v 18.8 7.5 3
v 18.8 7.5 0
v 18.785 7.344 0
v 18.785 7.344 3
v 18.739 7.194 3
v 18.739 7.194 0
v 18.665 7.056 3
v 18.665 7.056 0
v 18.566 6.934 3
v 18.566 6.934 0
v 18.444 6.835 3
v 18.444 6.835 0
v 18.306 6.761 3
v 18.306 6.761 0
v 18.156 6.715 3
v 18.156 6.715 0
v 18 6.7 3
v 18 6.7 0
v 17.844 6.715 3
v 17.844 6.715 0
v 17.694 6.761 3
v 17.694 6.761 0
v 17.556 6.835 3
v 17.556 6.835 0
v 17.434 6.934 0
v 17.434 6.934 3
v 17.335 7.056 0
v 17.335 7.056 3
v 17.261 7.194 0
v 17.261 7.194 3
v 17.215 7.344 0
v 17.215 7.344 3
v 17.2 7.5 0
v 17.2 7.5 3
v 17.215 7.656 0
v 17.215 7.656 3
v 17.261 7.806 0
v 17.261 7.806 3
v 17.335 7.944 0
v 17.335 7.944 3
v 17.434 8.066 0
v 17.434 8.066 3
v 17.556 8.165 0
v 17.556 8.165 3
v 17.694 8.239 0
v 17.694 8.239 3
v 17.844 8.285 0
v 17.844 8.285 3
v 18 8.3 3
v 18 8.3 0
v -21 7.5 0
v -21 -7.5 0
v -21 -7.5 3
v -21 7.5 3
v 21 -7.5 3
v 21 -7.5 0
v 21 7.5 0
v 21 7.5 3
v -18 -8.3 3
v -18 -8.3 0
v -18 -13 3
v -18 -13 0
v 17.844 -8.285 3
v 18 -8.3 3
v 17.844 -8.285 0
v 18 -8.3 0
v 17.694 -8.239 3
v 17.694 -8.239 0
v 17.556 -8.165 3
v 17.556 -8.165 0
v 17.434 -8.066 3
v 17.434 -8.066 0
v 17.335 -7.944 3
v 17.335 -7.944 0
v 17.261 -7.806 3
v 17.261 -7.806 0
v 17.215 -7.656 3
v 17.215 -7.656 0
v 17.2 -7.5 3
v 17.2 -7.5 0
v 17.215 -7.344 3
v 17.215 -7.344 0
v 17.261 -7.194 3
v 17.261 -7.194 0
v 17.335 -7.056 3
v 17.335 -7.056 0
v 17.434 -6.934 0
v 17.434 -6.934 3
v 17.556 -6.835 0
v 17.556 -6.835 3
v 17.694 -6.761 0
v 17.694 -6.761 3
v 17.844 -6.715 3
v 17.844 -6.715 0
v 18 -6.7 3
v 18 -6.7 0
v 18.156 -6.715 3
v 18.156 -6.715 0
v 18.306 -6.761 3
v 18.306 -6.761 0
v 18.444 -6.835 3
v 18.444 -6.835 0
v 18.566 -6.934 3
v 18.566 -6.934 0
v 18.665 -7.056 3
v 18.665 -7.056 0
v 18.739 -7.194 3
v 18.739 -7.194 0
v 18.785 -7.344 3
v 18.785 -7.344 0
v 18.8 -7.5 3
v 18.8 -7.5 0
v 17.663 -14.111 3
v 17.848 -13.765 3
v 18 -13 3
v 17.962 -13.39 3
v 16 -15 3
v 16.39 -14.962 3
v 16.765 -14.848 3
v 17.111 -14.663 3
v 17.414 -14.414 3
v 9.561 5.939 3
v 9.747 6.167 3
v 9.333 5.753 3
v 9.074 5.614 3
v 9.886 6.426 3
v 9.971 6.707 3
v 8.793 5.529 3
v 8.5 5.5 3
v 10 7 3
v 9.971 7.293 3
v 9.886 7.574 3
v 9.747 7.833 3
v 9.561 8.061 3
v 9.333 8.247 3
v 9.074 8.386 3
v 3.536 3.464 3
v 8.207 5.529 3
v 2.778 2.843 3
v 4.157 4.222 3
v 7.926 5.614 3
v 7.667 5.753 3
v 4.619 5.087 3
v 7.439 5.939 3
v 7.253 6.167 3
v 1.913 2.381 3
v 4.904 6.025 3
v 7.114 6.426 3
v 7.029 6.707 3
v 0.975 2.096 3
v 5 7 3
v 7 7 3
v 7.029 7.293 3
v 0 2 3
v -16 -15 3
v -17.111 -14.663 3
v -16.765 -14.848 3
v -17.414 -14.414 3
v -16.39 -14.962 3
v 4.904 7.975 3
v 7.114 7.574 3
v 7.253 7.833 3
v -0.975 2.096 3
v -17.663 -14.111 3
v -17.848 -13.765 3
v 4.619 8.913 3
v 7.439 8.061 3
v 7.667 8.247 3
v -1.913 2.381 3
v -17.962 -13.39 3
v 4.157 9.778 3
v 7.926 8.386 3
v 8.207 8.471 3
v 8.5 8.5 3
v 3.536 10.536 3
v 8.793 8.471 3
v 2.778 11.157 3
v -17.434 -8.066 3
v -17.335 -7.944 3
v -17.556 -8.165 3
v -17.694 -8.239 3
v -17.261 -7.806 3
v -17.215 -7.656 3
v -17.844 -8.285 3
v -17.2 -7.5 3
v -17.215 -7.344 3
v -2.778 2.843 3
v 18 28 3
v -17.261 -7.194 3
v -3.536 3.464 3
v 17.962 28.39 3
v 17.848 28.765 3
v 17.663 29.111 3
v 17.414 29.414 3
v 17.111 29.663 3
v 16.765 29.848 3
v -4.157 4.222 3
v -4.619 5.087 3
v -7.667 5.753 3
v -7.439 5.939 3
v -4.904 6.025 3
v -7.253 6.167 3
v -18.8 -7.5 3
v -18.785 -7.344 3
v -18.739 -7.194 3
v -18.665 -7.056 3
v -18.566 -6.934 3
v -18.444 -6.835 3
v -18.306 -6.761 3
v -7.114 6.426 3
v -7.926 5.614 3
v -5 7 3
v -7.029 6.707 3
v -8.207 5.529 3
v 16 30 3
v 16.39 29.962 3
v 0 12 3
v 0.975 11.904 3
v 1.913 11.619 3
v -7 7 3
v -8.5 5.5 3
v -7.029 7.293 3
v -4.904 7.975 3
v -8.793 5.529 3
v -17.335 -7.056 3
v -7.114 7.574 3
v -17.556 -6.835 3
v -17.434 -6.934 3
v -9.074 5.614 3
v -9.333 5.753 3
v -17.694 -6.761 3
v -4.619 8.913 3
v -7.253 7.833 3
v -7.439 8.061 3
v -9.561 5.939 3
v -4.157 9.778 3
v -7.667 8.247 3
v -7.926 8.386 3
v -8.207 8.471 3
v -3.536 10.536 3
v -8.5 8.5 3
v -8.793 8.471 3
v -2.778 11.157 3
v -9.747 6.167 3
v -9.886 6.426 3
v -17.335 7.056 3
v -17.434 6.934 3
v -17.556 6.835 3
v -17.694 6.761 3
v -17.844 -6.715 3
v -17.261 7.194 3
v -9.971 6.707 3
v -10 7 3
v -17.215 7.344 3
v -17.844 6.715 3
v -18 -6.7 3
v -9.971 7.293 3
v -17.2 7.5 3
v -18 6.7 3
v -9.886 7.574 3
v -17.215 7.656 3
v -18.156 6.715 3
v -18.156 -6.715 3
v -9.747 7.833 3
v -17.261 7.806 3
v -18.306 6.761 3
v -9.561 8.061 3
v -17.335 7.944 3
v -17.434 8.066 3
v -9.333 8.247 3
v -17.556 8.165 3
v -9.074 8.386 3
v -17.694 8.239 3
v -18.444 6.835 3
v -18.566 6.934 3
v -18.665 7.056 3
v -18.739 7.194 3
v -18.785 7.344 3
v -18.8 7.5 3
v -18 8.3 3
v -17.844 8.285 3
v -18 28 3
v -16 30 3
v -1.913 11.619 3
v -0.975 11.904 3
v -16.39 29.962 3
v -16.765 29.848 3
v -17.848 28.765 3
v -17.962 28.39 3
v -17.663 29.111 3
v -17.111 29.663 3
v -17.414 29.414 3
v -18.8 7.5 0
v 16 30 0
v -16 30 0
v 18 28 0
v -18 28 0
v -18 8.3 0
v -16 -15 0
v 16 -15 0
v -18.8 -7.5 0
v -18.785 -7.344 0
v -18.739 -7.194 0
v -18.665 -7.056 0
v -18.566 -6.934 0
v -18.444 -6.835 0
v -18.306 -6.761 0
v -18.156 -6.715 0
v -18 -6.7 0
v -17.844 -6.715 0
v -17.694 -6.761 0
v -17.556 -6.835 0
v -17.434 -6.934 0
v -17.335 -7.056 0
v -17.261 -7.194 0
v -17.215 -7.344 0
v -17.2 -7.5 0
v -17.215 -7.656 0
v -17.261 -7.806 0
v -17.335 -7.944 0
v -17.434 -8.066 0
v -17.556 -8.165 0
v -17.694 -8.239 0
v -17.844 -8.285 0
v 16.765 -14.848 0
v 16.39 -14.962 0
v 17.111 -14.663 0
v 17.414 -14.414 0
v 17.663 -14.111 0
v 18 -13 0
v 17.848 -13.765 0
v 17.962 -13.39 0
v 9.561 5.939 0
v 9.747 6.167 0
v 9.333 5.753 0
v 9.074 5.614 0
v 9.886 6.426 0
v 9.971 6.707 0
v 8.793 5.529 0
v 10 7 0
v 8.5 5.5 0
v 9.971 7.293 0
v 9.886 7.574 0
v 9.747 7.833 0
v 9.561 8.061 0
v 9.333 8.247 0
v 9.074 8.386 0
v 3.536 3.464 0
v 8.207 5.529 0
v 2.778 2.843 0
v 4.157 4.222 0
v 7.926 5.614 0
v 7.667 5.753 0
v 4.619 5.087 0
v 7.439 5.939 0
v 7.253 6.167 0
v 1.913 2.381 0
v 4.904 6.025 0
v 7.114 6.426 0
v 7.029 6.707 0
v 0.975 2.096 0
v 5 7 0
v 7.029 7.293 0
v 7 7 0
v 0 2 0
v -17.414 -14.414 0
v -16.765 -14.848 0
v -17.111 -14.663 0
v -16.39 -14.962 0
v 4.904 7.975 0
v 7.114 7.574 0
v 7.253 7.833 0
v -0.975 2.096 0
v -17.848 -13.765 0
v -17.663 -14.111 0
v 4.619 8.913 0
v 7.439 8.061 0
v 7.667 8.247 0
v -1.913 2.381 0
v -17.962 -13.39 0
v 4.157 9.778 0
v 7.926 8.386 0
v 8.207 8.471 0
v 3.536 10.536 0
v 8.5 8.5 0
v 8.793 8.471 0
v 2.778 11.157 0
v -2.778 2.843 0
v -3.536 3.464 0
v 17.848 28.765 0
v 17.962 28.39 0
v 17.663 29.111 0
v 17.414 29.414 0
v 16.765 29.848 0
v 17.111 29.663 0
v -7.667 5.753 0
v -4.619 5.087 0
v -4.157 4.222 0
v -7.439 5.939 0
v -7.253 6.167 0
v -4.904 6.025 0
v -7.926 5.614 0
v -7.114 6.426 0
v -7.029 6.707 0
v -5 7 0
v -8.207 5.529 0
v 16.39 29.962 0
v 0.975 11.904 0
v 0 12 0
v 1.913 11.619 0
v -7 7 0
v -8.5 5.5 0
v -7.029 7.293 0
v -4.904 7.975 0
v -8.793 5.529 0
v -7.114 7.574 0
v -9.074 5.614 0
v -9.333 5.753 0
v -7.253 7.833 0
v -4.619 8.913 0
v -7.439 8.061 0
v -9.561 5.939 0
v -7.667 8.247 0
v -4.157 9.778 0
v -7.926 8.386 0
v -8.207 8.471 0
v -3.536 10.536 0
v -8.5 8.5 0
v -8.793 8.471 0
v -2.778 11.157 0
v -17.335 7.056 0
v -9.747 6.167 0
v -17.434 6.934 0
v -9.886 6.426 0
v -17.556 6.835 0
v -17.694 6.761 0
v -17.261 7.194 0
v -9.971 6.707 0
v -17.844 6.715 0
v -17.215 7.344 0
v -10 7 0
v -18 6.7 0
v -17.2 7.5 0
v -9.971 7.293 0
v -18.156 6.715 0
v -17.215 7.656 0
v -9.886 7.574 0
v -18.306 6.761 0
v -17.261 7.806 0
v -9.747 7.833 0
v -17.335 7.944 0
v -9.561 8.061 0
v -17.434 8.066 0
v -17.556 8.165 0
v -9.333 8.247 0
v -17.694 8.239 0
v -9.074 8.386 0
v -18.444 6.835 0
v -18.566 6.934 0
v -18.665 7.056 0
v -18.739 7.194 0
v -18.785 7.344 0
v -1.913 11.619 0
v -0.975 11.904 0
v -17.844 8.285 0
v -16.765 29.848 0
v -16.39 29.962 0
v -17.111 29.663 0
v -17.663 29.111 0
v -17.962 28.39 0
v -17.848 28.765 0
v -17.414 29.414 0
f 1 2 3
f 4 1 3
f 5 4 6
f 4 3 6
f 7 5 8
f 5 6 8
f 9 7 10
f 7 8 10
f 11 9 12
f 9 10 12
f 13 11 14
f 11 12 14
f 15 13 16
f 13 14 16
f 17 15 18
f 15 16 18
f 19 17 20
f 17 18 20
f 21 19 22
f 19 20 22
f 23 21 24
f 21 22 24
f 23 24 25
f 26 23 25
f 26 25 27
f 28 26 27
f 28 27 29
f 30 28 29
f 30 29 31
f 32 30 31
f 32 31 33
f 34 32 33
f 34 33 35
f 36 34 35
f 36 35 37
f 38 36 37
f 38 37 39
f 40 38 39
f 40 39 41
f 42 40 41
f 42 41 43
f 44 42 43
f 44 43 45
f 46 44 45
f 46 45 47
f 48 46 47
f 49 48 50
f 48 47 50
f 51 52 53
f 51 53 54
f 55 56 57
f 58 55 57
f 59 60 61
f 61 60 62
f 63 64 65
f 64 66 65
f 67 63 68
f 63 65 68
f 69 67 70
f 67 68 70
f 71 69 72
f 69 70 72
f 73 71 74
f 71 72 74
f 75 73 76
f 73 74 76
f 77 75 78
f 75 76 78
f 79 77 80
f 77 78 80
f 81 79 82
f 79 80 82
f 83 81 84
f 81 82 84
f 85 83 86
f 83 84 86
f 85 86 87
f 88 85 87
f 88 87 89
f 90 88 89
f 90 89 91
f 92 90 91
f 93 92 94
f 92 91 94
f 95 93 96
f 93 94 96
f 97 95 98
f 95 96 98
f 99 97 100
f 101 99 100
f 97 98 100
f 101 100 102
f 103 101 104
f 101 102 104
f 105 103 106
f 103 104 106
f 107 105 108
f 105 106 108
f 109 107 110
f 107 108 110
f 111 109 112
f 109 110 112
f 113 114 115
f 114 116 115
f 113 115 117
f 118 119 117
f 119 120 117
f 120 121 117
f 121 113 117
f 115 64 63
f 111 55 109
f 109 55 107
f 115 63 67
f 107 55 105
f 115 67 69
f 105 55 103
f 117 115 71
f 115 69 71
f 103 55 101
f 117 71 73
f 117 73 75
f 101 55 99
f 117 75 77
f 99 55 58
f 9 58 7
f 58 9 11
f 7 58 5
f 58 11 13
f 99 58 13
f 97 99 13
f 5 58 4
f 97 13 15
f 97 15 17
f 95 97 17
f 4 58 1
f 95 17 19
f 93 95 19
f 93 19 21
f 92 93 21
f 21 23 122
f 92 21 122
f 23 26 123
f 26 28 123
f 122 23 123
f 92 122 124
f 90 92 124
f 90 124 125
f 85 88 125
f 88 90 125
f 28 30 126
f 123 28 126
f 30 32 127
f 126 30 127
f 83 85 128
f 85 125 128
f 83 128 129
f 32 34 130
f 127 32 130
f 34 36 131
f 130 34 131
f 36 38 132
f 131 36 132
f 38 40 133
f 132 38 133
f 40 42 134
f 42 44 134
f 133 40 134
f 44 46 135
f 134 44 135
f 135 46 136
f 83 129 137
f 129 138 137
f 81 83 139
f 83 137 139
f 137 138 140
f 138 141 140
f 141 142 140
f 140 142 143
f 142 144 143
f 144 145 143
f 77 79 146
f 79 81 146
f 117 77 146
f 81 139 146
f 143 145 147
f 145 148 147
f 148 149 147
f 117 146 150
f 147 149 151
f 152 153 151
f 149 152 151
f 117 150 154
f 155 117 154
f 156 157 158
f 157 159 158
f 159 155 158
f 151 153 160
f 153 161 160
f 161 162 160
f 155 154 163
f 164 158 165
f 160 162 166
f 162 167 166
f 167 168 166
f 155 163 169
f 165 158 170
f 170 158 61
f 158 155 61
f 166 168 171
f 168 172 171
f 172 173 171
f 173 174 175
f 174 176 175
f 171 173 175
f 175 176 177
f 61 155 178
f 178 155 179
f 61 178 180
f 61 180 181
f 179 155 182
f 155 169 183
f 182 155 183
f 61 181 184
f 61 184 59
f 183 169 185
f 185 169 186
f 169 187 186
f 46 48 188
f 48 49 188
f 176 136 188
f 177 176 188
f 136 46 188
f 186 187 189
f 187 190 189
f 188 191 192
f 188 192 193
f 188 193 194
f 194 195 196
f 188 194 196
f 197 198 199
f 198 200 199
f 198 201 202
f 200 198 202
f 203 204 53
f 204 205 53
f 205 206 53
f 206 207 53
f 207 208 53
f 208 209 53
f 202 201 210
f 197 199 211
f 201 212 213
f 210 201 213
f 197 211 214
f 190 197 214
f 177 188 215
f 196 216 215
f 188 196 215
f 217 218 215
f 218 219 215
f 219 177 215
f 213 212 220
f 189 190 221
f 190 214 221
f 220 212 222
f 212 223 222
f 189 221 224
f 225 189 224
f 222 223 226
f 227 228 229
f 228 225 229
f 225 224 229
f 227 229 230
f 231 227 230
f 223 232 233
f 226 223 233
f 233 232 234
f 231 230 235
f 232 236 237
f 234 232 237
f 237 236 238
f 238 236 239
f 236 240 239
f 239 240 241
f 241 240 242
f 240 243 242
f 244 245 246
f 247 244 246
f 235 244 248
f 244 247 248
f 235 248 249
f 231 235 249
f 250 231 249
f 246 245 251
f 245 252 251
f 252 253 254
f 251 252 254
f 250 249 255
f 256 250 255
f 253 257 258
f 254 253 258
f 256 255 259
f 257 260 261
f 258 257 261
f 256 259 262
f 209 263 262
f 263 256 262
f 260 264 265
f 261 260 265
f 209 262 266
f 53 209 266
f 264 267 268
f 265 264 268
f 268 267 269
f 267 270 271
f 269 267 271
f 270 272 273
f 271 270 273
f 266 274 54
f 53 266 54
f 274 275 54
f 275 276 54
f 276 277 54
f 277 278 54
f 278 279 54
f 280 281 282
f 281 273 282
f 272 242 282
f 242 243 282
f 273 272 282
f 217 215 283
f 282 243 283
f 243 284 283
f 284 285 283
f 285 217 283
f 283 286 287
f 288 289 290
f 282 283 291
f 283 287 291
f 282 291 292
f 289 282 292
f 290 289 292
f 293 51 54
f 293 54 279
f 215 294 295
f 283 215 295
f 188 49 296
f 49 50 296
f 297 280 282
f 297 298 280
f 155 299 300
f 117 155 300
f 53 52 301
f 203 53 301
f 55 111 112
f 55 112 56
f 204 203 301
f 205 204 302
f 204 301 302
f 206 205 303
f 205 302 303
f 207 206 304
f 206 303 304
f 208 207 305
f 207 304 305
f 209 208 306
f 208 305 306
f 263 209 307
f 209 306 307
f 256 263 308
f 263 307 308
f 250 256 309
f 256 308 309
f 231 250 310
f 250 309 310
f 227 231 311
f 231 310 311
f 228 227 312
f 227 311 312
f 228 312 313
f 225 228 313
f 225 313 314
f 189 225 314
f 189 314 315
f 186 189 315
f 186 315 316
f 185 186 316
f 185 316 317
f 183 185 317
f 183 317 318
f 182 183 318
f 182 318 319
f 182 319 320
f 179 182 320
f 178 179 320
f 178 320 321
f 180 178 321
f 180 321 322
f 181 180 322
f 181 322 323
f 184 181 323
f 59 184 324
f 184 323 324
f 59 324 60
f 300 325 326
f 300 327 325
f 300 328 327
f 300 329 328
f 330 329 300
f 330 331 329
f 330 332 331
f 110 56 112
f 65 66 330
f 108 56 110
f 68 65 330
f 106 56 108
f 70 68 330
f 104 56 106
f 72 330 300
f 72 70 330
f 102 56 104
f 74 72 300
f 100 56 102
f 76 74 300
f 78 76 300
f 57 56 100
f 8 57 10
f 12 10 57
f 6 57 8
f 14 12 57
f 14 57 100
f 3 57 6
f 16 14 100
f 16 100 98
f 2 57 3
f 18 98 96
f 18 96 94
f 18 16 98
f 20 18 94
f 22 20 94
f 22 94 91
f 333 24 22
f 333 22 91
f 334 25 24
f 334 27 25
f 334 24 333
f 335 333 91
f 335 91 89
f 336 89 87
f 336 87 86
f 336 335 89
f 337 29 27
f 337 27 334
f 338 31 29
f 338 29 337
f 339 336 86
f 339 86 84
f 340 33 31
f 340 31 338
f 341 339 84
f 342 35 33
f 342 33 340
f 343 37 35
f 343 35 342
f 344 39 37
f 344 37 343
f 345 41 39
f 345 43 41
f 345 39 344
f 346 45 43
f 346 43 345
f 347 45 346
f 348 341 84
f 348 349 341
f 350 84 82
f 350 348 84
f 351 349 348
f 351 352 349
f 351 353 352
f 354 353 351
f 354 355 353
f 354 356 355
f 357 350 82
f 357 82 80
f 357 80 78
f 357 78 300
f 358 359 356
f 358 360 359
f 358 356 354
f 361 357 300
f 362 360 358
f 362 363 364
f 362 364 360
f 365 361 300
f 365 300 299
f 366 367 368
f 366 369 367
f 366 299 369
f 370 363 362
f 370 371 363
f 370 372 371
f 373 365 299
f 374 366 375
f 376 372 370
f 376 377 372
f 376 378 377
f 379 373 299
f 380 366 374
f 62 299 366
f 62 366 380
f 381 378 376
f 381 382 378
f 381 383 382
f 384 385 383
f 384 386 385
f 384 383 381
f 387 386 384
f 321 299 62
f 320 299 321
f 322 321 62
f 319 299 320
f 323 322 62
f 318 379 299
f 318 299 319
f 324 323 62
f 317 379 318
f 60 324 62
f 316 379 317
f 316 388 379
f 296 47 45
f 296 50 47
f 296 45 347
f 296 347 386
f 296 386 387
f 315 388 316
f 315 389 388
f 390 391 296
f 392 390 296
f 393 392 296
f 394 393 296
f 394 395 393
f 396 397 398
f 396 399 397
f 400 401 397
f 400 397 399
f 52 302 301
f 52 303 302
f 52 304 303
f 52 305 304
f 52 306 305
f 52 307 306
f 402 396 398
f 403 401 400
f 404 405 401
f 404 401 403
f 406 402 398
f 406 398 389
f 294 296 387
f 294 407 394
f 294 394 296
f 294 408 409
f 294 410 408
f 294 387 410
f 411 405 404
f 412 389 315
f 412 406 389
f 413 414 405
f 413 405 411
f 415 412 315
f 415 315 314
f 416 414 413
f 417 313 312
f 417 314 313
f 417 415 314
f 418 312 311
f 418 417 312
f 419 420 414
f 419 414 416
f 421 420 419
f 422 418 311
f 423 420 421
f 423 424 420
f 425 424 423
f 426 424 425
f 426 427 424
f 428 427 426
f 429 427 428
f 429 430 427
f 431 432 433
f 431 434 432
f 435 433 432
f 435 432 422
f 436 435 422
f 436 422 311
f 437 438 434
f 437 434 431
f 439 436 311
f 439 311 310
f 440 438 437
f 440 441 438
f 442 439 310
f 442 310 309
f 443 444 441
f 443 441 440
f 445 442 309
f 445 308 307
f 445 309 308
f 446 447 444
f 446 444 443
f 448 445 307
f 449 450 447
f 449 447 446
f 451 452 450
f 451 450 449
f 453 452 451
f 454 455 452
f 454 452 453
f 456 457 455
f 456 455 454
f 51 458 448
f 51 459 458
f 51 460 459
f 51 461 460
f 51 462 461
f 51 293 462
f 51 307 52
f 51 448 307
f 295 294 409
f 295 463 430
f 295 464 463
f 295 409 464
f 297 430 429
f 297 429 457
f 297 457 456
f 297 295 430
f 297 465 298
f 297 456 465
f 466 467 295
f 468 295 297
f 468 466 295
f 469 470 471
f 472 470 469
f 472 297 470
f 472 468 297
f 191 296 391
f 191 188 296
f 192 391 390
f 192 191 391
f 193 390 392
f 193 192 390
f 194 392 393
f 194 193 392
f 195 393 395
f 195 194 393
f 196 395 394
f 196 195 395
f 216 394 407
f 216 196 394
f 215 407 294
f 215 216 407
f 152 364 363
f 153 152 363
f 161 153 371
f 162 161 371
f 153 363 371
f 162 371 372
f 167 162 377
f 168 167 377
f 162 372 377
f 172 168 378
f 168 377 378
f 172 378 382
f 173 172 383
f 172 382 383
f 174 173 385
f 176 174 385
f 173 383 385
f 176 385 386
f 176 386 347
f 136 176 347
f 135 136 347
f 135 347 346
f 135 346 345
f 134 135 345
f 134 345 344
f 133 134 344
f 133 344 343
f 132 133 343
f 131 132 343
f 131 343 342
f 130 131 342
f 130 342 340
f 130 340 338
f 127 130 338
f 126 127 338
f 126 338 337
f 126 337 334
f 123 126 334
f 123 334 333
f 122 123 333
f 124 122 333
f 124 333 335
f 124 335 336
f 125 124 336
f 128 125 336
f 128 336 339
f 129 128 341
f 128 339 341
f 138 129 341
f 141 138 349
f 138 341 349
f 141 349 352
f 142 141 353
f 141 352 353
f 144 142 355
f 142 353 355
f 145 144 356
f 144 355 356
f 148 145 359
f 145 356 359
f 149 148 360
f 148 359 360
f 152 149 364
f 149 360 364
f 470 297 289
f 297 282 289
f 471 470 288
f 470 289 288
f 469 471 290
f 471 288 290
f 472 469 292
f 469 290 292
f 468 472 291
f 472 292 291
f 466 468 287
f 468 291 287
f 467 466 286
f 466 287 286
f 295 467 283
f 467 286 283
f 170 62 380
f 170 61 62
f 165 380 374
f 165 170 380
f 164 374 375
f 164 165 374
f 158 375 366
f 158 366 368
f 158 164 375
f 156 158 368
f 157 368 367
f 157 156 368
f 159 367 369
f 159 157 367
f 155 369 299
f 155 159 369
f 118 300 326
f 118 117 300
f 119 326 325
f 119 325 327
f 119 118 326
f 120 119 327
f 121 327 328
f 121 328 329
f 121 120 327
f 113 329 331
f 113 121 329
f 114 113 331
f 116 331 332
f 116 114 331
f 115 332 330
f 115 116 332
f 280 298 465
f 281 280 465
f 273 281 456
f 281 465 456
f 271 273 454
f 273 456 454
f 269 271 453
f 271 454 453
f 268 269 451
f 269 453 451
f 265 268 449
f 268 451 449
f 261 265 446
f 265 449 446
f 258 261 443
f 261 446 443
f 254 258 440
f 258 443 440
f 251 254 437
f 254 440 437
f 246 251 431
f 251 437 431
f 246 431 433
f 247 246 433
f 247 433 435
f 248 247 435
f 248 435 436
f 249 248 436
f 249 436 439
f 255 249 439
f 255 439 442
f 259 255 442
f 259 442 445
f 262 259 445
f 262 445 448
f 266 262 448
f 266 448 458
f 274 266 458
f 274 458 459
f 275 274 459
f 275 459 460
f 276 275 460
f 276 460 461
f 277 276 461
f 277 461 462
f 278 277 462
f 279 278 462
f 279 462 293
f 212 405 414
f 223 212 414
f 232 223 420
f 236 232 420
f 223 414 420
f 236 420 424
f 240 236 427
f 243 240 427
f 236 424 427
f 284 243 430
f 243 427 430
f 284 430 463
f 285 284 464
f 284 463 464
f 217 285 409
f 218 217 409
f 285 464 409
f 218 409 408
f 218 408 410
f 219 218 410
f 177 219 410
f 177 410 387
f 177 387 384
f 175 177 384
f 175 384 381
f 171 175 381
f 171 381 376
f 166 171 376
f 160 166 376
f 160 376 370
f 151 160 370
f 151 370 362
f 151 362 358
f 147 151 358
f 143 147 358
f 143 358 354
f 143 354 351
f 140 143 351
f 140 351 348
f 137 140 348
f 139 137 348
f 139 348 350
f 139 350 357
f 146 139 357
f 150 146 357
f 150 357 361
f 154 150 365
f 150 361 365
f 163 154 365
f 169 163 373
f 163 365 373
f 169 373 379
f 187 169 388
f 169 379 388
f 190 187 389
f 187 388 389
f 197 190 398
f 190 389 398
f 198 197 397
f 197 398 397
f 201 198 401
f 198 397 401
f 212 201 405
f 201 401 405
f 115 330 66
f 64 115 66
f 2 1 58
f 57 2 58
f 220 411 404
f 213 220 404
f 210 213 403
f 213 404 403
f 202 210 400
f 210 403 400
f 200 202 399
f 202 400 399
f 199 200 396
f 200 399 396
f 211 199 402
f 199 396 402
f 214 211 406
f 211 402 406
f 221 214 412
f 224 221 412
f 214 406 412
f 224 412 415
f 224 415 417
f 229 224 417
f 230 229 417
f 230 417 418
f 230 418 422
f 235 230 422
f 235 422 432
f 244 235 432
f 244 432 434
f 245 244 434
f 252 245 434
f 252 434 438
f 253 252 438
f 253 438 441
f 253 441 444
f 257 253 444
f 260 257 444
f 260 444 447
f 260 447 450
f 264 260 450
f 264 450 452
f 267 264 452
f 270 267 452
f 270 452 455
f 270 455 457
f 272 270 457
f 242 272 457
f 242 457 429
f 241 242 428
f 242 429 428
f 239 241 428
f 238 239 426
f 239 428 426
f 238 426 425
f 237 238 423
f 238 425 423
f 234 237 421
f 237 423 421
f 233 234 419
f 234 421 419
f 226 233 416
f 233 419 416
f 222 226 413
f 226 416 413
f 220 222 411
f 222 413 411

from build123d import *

# Parameters (mm, degrees)
SKETCH1_W           = 3
SKETCH1_H           = 15
BOSS_EXTRUDE1_DEPTH = 3
SKETCH3_W           = 36
SKETCH3_H           = 15
BOSS_EXTRUDE2_DEPTH = 3
SKETCH4_R           = 5
SKETCH4_R_2         = 1.5
CUT_EXTRUDE1_DEPTH  = 37.742346142
SKETCH5_R           = 0.8
CUT_EXTRUDE2_DEPTH  = 37.742346142
FILLET1_R           = 2


with BuildPart() as part:
    # Sketch1 → Boss-Extrude1 (new body)
    with BuildSketch(Plane.XY):
        Polygon((-18, -7.5), (-18, -15), (18, -15), (18, -7.5), (15, -7.5), (15, 7.5), (18, 7.5), (18, 15), (-18, 15), (-18, 7.5), (-15, 7.5), (-15, -7.5), align=None)
        with Locations((-19.5, 0)):
            Rectangle(SKETCH1_W, SKETCH1_H)
        with Locations((-16.5, 0)):
            Rectangle(SKETCH1_W, SKETCH1_H)
        with Locations((19.5, 0)):
            Rectangle(SKETCH1_W, SKETCH1_H)
        with Locations((16.5, 0)):
            Rectangle(SKETCH1_W, SKETCH1_H)
    extrude(amount=BOSS_EXTRUDE1_DEPTH)

    # Sketch3 → Boss-Extrude2 (add)
    with BuildSketch(Plane(origin=(0, 0, 0), x_dir=(-1, 0, 0), z_dir=(0, 0, -1))):
        with Locations((0, 22.5)):
            Rectangle(SKETCH3_W, SKETCH3_H)
    extrude(amount=-BOSS_EXTRUDE2_DEPTH)

    # Sketch4 → Cut-Extrude1 (cut, through all)
    with BuildSketch(Plane(origin=(0, 0, 0), x_dir=(-1, 0, 0), z_dir=(0, 0, -1))):
        with Locations((0, 7)):
            Circle(SKETCH4_R)
        with Locations((-8.5, 7)):
            Circle(SKETCH4_R_2)
        with Locations(Location((8.5, 7, 0), (0, 0, 180))):
            Circle(SKETCH4_R_2)
    extrude(amount=-CUT_EXTRUDE1_DEPTH, mode=Mode.SUBTRACT)

    # Sketch5 → Cut-Extrude2 (cut, through all)
    with BuildSketch(Plane(origin=(0, 0, 0), x_dir=(-1, 0, 0), z_dir=(0, 0, -1))):
        with Locations((-18, 7.5)):
            Circle(SKETCH5_R)
        with Locations((-18, -7.5)):
            Circle(SKETCH5_R)
        with Locations((18, 7.5)):
            Circle(SKETCH5_R)
        with Locations((18, -7.5)):
            Circle(SKETCH5_R)
    extrude(amount=-CUT_EXTRUDE2_DEPTH, mode=Mode.SUBTRACT)

    # Fillet1
    fillet1_edges = [part.edges().sort_by_distance(p)[0] for p in [
        (18, -15, 1.5),
        (-18, -15, 1.5),
        (-18, 30, 1.5),
        (18, 30, 1.5),
    ]]
    fillet(fillet1_edges, radius=FILLET1_R)


solid = part.part
